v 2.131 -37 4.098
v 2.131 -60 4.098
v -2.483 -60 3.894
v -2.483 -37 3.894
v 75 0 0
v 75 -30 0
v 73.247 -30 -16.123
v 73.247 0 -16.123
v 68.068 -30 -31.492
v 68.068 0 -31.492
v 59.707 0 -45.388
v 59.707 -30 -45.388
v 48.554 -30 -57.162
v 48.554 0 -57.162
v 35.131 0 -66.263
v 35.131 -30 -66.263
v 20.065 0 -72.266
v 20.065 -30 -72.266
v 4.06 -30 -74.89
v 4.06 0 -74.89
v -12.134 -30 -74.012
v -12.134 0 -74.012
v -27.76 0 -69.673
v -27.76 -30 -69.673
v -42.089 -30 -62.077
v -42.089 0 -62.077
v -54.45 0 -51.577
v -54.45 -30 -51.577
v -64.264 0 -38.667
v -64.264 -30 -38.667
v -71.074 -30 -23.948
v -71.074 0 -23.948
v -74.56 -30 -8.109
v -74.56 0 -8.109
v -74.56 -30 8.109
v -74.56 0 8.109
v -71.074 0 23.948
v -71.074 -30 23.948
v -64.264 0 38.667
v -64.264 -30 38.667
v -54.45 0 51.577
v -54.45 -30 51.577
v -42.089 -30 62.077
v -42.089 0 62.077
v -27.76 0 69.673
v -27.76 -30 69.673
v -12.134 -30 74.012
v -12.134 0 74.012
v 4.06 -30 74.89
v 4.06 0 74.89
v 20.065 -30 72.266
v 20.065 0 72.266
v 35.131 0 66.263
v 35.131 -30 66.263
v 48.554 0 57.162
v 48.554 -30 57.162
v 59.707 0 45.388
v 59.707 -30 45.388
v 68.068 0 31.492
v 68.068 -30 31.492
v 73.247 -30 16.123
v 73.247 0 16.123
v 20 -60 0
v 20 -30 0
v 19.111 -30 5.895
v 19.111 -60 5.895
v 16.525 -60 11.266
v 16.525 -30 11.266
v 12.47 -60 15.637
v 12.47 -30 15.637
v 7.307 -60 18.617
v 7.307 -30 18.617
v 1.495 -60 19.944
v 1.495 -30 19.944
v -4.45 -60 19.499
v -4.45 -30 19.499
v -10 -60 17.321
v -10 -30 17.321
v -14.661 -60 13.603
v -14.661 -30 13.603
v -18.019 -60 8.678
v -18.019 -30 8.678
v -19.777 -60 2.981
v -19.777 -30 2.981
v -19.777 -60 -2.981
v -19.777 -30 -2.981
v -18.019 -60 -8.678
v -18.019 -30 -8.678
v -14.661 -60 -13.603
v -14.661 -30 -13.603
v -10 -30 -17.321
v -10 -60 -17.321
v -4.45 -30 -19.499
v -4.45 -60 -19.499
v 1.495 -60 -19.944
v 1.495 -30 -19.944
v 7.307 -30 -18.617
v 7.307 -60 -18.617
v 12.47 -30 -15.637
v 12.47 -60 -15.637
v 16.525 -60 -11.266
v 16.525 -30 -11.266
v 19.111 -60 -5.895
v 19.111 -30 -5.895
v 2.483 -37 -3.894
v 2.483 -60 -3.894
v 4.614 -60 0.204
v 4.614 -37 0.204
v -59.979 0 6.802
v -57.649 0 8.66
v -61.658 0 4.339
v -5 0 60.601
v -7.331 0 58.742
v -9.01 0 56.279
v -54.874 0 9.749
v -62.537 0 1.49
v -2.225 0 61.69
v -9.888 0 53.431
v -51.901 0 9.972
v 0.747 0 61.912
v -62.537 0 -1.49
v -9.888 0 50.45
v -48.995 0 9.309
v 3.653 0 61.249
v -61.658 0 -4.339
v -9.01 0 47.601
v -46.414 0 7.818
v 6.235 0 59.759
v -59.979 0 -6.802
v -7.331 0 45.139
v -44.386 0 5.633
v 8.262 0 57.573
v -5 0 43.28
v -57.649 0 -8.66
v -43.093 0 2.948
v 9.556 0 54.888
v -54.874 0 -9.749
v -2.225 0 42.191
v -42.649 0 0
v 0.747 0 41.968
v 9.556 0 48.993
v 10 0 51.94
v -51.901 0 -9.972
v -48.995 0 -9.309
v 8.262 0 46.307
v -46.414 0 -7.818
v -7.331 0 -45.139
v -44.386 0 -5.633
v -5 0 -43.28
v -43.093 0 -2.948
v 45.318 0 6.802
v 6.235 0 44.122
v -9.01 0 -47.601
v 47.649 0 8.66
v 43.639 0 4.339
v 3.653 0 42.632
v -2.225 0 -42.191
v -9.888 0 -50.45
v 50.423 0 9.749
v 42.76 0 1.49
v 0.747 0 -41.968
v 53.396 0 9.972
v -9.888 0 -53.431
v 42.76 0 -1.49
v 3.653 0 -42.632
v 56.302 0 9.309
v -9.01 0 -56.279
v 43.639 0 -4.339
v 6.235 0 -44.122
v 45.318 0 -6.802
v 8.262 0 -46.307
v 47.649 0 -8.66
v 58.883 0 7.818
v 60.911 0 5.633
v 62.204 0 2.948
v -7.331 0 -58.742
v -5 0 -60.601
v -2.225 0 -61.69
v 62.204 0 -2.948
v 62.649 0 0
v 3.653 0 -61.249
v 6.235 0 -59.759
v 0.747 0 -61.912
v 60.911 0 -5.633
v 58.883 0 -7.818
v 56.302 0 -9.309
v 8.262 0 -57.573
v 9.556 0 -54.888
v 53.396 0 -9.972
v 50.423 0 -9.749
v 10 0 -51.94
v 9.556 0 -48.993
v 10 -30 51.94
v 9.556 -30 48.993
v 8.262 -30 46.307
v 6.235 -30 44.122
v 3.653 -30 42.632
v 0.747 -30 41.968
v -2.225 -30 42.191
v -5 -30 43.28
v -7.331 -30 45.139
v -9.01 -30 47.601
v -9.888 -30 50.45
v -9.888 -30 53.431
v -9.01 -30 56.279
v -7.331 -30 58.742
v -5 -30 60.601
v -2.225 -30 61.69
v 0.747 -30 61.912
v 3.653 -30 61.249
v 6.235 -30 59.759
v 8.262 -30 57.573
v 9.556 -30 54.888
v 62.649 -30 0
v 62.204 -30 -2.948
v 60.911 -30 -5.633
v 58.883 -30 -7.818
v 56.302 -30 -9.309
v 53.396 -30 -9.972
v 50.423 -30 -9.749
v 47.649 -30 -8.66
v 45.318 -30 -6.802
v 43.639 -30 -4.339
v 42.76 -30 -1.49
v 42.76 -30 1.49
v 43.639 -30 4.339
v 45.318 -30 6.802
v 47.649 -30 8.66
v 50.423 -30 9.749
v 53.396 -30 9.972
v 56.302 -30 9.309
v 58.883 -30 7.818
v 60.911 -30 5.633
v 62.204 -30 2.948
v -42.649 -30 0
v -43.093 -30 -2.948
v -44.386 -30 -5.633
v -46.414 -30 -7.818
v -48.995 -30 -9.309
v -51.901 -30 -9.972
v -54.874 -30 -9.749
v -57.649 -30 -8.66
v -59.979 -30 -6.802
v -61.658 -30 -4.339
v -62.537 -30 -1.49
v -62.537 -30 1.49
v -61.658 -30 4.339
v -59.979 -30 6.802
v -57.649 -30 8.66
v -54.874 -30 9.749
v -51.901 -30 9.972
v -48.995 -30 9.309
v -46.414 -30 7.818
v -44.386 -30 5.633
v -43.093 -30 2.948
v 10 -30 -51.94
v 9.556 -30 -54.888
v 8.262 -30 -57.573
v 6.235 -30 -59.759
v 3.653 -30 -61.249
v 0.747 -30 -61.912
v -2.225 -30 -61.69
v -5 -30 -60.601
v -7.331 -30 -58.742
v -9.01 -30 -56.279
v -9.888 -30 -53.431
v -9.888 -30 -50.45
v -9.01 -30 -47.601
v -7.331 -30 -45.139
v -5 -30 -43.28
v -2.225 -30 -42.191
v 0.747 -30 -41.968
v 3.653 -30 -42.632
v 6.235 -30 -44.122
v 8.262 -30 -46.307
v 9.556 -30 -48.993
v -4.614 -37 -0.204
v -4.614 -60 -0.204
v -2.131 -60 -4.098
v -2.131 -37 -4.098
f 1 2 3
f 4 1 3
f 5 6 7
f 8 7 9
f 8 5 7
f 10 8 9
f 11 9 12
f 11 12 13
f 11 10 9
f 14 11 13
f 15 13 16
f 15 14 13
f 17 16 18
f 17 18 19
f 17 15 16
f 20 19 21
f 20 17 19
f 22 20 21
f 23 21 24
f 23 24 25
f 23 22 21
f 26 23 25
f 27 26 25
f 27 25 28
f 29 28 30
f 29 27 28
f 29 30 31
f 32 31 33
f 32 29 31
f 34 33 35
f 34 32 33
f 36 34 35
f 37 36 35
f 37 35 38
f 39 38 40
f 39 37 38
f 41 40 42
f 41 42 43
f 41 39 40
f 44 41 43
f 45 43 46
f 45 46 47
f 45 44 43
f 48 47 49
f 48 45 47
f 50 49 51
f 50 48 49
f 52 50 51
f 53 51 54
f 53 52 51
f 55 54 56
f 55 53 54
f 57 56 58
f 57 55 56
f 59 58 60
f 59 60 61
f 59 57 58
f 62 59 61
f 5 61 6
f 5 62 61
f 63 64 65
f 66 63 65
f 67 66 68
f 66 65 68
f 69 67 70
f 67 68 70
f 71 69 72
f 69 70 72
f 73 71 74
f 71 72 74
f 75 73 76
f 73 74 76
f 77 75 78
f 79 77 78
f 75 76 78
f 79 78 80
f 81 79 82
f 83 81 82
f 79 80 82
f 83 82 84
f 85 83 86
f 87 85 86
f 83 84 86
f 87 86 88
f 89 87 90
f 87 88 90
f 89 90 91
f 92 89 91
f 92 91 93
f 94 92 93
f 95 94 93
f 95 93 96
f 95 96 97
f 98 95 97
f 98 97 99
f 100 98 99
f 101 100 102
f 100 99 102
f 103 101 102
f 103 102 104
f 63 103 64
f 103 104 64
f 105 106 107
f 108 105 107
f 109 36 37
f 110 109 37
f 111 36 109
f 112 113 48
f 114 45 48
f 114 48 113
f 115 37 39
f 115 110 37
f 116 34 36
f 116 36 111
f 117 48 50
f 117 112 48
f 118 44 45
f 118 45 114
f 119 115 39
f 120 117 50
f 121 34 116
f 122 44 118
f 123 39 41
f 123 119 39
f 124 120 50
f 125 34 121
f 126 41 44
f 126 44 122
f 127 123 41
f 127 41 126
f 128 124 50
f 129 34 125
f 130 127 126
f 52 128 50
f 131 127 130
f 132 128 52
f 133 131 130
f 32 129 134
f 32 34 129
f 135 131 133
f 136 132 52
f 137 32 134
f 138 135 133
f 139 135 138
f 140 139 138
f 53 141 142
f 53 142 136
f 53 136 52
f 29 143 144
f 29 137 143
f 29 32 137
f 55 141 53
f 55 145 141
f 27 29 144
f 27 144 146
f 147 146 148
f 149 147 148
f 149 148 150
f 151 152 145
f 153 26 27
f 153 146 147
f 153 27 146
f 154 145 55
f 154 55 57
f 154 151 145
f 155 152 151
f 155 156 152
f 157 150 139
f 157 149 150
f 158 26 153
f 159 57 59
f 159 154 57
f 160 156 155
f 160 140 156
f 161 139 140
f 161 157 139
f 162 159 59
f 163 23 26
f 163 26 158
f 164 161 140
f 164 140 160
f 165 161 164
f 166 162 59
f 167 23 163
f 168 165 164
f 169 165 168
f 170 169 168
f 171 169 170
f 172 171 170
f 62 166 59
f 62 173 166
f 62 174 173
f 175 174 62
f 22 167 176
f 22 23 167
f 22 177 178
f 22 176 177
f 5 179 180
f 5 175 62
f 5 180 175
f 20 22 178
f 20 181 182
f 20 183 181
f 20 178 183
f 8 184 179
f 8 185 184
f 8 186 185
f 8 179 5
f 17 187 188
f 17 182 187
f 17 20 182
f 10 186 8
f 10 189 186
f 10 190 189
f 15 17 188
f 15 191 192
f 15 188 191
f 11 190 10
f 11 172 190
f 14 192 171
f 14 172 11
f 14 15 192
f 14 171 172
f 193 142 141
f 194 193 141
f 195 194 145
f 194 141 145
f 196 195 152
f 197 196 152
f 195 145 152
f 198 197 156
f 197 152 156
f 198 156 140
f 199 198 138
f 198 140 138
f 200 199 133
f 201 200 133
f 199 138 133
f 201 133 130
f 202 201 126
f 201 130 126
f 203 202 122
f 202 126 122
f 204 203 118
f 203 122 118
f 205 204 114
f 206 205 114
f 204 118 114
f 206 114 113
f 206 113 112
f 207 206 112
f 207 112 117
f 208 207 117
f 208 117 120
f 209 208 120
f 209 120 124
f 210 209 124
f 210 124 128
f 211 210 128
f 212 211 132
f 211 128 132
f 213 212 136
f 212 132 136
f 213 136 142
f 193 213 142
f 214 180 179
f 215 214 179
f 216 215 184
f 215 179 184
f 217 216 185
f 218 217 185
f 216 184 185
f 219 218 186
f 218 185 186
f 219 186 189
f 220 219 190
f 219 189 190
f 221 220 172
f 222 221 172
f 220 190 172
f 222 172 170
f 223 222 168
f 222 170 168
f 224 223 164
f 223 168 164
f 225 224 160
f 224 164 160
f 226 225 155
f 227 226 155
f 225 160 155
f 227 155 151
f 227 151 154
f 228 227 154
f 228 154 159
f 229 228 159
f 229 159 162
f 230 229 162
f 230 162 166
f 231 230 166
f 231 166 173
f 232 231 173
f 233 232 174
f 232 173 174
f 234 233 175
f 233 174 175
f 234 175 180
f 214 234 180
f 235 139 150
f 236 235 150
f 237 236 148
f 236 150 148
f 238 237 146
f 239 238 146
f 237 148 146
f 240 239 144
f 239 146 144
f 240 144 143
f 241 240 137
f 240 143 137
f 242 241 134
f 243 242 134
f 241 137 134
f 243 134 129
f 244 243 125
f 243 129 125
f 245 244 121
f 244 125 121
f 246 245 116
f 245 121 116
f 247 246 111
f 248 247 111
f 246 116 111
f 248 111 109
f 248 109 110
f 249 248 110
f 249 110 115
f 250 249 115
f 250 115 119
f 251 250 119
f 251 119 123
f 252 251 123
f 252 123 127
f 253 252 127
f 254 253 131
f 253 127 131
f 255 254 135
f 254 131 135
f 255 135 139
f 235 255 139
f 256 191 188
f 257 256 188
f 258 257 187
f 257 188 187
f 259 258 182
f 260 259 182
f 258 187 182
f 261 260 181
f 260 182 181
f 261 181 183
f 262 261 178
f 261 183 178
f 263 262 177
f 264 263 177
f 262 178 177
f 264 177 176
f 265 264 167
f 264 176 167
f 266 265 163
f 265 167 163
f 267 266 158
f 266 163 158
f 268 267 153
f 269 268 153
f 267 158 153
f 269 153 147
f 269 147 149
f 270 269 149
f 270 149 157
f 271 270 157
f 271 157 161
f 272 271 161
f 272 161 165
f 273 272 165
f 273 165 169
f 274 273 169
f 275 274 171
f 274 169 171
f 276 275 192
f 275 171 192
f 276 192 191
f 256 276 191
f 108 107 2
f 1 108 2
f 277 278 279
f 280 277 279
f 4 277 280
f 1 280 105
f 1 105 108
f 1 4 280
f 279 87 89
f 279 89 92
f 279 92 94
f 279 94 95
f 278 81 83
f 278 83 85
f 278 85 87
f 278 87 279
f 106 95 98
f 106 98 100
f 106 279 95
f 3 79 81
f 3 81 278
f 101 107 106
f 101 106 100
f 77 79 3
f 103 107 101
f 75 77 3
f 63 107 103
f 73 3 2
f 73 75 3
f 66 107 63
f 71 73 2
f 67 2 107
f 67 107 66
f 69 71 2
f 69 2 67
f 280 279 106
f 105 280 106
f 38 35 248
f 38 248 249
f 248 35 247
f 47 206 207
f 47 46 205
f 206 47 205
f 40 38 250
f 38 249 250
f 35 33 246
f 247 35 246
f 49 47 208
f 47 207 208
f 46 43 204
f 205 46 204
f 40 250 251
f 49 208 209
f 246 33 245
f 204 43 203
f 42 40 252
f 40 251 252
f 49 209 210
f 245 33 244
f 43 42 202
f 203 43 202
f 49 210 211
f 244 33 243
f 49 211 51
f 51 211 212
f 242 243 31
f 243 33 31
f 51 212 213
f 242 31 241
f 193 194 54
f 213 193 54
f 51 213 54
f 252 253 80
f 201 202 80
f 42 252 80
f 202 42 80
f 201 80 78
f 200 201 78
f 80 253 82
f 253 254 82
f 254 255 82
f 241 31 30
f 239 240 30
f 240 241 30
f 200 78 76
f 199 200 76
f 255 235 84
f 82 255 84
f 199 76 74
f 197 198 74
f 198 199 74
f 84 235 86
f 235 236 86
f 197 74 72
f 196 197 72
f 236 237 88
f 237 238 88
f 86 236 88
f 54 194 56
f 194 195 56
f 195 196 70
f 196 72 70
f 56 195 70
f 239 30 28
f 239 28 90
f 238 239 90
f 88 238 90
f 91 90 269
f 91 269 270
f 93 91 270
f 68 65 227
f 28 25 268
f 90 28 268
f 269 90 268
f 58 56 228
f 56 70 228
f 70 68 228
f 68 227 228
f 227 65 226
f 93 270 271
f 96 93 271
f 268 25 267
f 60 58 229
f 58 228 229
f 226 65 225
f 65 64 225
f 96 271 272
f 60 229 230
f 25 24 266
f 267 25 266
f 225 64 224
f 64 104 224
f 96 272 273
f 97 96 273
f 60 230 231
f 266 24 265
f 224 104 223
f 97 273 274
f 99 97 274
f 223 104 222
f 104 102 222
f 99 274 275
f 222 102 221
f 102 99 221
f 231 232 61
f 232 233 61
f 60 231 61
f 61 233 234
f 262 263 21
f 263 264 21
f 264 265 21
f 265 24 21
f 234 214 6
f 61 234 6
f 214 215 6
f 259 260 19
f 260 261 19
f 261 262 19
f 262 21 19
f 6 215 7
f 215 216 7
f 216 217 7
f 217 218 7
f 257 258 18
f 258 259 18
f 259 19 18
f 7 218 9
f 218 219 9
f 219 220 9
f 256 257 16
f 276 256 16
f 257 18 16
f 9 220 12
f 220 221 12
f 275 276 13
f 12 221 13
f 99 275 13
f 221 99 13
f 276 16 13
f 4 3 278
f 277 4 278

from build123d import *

# Parameters (mm, degrees)
SKETCH1_R           = 75
SKETCH1_R_2         = 10
BOSS_EXTRUDE1_DEPTH = 30
SKETCH2_R           = 20
BOSS_EXTRUDE2_DEPTH = 30
BOSS_EXTRUDE5_DEPTH = 60
CUT_EXTRUDE1_DEPTH  = 23


with BuildPart() as part:
    # Sketch1 → Boss-Extrude1 (new body)
    with BuildSketch(Plane(origin=(0, 0, 0), x_dir=(1, 0, 0), z_dir=(0, 1, 0))):
        Circle(SKETCH1_R)
        with Locations((0, -51.940298755)):
            Circle(SKETCH1_R_2, mode=Mode.SUBTRACT)
        with Locations((52.648575556, 0)):
            Circle(SKETCH1_R_2, mode=Mode.SUBTRACT)
        with Locations((-52.648575556, 0)):
            Circle(SKETCH1_R_2, mode=Mode.SUBTRACT)
        with Locations((0, 51.940298755)):
            Circle(SKETCH1_R_2, mode=Mode.SUBTRACT)
    extrude(amount=-BOSS_EXTRUDE1_DEPTH)

    # Sketch2 → Boss-Extrude2 (add)
    with BuildSketch(Plane.XZ.offset(30)):
        Circle(SKETCH2_R)
    extrude(amount=BOSS_EXTRUDE2_DEPTH)

    # Sketch3 → Boss-Extrude5 (add, through all)
    with BuildSketch(Plane.XZ.offset(60)):
        Polygon((2.130897014, 4.097878872), (-2.483418698, 3.894350383), (-4.614315712, -0.20352849), (-2.130897014, -4.097878872), (2.483418698, -3.894350383), (4.614315712, 0.20352849), align=None)
    extrude(amount=-BOSS_EXTRUDE5_DEPTH)

    # Sketch3<3> → Cut-Extrude1 (cut)
    with BuildSketch(Plane.XZ.offset(60)):
        Polygon((2.130897014, 4.097878872), (-2.483418698, 3.894350383), (-4.614315712, -0.20352849), (-2.130897014, -4.097878872), (2.483418698, -3.894350383), (4.614315712, 0.20352849), align=None)
    extrude(amount=-CUT_EXTRUDE1_DEPTH, mode=Mode.SUBTRACT)


solid = part.part
